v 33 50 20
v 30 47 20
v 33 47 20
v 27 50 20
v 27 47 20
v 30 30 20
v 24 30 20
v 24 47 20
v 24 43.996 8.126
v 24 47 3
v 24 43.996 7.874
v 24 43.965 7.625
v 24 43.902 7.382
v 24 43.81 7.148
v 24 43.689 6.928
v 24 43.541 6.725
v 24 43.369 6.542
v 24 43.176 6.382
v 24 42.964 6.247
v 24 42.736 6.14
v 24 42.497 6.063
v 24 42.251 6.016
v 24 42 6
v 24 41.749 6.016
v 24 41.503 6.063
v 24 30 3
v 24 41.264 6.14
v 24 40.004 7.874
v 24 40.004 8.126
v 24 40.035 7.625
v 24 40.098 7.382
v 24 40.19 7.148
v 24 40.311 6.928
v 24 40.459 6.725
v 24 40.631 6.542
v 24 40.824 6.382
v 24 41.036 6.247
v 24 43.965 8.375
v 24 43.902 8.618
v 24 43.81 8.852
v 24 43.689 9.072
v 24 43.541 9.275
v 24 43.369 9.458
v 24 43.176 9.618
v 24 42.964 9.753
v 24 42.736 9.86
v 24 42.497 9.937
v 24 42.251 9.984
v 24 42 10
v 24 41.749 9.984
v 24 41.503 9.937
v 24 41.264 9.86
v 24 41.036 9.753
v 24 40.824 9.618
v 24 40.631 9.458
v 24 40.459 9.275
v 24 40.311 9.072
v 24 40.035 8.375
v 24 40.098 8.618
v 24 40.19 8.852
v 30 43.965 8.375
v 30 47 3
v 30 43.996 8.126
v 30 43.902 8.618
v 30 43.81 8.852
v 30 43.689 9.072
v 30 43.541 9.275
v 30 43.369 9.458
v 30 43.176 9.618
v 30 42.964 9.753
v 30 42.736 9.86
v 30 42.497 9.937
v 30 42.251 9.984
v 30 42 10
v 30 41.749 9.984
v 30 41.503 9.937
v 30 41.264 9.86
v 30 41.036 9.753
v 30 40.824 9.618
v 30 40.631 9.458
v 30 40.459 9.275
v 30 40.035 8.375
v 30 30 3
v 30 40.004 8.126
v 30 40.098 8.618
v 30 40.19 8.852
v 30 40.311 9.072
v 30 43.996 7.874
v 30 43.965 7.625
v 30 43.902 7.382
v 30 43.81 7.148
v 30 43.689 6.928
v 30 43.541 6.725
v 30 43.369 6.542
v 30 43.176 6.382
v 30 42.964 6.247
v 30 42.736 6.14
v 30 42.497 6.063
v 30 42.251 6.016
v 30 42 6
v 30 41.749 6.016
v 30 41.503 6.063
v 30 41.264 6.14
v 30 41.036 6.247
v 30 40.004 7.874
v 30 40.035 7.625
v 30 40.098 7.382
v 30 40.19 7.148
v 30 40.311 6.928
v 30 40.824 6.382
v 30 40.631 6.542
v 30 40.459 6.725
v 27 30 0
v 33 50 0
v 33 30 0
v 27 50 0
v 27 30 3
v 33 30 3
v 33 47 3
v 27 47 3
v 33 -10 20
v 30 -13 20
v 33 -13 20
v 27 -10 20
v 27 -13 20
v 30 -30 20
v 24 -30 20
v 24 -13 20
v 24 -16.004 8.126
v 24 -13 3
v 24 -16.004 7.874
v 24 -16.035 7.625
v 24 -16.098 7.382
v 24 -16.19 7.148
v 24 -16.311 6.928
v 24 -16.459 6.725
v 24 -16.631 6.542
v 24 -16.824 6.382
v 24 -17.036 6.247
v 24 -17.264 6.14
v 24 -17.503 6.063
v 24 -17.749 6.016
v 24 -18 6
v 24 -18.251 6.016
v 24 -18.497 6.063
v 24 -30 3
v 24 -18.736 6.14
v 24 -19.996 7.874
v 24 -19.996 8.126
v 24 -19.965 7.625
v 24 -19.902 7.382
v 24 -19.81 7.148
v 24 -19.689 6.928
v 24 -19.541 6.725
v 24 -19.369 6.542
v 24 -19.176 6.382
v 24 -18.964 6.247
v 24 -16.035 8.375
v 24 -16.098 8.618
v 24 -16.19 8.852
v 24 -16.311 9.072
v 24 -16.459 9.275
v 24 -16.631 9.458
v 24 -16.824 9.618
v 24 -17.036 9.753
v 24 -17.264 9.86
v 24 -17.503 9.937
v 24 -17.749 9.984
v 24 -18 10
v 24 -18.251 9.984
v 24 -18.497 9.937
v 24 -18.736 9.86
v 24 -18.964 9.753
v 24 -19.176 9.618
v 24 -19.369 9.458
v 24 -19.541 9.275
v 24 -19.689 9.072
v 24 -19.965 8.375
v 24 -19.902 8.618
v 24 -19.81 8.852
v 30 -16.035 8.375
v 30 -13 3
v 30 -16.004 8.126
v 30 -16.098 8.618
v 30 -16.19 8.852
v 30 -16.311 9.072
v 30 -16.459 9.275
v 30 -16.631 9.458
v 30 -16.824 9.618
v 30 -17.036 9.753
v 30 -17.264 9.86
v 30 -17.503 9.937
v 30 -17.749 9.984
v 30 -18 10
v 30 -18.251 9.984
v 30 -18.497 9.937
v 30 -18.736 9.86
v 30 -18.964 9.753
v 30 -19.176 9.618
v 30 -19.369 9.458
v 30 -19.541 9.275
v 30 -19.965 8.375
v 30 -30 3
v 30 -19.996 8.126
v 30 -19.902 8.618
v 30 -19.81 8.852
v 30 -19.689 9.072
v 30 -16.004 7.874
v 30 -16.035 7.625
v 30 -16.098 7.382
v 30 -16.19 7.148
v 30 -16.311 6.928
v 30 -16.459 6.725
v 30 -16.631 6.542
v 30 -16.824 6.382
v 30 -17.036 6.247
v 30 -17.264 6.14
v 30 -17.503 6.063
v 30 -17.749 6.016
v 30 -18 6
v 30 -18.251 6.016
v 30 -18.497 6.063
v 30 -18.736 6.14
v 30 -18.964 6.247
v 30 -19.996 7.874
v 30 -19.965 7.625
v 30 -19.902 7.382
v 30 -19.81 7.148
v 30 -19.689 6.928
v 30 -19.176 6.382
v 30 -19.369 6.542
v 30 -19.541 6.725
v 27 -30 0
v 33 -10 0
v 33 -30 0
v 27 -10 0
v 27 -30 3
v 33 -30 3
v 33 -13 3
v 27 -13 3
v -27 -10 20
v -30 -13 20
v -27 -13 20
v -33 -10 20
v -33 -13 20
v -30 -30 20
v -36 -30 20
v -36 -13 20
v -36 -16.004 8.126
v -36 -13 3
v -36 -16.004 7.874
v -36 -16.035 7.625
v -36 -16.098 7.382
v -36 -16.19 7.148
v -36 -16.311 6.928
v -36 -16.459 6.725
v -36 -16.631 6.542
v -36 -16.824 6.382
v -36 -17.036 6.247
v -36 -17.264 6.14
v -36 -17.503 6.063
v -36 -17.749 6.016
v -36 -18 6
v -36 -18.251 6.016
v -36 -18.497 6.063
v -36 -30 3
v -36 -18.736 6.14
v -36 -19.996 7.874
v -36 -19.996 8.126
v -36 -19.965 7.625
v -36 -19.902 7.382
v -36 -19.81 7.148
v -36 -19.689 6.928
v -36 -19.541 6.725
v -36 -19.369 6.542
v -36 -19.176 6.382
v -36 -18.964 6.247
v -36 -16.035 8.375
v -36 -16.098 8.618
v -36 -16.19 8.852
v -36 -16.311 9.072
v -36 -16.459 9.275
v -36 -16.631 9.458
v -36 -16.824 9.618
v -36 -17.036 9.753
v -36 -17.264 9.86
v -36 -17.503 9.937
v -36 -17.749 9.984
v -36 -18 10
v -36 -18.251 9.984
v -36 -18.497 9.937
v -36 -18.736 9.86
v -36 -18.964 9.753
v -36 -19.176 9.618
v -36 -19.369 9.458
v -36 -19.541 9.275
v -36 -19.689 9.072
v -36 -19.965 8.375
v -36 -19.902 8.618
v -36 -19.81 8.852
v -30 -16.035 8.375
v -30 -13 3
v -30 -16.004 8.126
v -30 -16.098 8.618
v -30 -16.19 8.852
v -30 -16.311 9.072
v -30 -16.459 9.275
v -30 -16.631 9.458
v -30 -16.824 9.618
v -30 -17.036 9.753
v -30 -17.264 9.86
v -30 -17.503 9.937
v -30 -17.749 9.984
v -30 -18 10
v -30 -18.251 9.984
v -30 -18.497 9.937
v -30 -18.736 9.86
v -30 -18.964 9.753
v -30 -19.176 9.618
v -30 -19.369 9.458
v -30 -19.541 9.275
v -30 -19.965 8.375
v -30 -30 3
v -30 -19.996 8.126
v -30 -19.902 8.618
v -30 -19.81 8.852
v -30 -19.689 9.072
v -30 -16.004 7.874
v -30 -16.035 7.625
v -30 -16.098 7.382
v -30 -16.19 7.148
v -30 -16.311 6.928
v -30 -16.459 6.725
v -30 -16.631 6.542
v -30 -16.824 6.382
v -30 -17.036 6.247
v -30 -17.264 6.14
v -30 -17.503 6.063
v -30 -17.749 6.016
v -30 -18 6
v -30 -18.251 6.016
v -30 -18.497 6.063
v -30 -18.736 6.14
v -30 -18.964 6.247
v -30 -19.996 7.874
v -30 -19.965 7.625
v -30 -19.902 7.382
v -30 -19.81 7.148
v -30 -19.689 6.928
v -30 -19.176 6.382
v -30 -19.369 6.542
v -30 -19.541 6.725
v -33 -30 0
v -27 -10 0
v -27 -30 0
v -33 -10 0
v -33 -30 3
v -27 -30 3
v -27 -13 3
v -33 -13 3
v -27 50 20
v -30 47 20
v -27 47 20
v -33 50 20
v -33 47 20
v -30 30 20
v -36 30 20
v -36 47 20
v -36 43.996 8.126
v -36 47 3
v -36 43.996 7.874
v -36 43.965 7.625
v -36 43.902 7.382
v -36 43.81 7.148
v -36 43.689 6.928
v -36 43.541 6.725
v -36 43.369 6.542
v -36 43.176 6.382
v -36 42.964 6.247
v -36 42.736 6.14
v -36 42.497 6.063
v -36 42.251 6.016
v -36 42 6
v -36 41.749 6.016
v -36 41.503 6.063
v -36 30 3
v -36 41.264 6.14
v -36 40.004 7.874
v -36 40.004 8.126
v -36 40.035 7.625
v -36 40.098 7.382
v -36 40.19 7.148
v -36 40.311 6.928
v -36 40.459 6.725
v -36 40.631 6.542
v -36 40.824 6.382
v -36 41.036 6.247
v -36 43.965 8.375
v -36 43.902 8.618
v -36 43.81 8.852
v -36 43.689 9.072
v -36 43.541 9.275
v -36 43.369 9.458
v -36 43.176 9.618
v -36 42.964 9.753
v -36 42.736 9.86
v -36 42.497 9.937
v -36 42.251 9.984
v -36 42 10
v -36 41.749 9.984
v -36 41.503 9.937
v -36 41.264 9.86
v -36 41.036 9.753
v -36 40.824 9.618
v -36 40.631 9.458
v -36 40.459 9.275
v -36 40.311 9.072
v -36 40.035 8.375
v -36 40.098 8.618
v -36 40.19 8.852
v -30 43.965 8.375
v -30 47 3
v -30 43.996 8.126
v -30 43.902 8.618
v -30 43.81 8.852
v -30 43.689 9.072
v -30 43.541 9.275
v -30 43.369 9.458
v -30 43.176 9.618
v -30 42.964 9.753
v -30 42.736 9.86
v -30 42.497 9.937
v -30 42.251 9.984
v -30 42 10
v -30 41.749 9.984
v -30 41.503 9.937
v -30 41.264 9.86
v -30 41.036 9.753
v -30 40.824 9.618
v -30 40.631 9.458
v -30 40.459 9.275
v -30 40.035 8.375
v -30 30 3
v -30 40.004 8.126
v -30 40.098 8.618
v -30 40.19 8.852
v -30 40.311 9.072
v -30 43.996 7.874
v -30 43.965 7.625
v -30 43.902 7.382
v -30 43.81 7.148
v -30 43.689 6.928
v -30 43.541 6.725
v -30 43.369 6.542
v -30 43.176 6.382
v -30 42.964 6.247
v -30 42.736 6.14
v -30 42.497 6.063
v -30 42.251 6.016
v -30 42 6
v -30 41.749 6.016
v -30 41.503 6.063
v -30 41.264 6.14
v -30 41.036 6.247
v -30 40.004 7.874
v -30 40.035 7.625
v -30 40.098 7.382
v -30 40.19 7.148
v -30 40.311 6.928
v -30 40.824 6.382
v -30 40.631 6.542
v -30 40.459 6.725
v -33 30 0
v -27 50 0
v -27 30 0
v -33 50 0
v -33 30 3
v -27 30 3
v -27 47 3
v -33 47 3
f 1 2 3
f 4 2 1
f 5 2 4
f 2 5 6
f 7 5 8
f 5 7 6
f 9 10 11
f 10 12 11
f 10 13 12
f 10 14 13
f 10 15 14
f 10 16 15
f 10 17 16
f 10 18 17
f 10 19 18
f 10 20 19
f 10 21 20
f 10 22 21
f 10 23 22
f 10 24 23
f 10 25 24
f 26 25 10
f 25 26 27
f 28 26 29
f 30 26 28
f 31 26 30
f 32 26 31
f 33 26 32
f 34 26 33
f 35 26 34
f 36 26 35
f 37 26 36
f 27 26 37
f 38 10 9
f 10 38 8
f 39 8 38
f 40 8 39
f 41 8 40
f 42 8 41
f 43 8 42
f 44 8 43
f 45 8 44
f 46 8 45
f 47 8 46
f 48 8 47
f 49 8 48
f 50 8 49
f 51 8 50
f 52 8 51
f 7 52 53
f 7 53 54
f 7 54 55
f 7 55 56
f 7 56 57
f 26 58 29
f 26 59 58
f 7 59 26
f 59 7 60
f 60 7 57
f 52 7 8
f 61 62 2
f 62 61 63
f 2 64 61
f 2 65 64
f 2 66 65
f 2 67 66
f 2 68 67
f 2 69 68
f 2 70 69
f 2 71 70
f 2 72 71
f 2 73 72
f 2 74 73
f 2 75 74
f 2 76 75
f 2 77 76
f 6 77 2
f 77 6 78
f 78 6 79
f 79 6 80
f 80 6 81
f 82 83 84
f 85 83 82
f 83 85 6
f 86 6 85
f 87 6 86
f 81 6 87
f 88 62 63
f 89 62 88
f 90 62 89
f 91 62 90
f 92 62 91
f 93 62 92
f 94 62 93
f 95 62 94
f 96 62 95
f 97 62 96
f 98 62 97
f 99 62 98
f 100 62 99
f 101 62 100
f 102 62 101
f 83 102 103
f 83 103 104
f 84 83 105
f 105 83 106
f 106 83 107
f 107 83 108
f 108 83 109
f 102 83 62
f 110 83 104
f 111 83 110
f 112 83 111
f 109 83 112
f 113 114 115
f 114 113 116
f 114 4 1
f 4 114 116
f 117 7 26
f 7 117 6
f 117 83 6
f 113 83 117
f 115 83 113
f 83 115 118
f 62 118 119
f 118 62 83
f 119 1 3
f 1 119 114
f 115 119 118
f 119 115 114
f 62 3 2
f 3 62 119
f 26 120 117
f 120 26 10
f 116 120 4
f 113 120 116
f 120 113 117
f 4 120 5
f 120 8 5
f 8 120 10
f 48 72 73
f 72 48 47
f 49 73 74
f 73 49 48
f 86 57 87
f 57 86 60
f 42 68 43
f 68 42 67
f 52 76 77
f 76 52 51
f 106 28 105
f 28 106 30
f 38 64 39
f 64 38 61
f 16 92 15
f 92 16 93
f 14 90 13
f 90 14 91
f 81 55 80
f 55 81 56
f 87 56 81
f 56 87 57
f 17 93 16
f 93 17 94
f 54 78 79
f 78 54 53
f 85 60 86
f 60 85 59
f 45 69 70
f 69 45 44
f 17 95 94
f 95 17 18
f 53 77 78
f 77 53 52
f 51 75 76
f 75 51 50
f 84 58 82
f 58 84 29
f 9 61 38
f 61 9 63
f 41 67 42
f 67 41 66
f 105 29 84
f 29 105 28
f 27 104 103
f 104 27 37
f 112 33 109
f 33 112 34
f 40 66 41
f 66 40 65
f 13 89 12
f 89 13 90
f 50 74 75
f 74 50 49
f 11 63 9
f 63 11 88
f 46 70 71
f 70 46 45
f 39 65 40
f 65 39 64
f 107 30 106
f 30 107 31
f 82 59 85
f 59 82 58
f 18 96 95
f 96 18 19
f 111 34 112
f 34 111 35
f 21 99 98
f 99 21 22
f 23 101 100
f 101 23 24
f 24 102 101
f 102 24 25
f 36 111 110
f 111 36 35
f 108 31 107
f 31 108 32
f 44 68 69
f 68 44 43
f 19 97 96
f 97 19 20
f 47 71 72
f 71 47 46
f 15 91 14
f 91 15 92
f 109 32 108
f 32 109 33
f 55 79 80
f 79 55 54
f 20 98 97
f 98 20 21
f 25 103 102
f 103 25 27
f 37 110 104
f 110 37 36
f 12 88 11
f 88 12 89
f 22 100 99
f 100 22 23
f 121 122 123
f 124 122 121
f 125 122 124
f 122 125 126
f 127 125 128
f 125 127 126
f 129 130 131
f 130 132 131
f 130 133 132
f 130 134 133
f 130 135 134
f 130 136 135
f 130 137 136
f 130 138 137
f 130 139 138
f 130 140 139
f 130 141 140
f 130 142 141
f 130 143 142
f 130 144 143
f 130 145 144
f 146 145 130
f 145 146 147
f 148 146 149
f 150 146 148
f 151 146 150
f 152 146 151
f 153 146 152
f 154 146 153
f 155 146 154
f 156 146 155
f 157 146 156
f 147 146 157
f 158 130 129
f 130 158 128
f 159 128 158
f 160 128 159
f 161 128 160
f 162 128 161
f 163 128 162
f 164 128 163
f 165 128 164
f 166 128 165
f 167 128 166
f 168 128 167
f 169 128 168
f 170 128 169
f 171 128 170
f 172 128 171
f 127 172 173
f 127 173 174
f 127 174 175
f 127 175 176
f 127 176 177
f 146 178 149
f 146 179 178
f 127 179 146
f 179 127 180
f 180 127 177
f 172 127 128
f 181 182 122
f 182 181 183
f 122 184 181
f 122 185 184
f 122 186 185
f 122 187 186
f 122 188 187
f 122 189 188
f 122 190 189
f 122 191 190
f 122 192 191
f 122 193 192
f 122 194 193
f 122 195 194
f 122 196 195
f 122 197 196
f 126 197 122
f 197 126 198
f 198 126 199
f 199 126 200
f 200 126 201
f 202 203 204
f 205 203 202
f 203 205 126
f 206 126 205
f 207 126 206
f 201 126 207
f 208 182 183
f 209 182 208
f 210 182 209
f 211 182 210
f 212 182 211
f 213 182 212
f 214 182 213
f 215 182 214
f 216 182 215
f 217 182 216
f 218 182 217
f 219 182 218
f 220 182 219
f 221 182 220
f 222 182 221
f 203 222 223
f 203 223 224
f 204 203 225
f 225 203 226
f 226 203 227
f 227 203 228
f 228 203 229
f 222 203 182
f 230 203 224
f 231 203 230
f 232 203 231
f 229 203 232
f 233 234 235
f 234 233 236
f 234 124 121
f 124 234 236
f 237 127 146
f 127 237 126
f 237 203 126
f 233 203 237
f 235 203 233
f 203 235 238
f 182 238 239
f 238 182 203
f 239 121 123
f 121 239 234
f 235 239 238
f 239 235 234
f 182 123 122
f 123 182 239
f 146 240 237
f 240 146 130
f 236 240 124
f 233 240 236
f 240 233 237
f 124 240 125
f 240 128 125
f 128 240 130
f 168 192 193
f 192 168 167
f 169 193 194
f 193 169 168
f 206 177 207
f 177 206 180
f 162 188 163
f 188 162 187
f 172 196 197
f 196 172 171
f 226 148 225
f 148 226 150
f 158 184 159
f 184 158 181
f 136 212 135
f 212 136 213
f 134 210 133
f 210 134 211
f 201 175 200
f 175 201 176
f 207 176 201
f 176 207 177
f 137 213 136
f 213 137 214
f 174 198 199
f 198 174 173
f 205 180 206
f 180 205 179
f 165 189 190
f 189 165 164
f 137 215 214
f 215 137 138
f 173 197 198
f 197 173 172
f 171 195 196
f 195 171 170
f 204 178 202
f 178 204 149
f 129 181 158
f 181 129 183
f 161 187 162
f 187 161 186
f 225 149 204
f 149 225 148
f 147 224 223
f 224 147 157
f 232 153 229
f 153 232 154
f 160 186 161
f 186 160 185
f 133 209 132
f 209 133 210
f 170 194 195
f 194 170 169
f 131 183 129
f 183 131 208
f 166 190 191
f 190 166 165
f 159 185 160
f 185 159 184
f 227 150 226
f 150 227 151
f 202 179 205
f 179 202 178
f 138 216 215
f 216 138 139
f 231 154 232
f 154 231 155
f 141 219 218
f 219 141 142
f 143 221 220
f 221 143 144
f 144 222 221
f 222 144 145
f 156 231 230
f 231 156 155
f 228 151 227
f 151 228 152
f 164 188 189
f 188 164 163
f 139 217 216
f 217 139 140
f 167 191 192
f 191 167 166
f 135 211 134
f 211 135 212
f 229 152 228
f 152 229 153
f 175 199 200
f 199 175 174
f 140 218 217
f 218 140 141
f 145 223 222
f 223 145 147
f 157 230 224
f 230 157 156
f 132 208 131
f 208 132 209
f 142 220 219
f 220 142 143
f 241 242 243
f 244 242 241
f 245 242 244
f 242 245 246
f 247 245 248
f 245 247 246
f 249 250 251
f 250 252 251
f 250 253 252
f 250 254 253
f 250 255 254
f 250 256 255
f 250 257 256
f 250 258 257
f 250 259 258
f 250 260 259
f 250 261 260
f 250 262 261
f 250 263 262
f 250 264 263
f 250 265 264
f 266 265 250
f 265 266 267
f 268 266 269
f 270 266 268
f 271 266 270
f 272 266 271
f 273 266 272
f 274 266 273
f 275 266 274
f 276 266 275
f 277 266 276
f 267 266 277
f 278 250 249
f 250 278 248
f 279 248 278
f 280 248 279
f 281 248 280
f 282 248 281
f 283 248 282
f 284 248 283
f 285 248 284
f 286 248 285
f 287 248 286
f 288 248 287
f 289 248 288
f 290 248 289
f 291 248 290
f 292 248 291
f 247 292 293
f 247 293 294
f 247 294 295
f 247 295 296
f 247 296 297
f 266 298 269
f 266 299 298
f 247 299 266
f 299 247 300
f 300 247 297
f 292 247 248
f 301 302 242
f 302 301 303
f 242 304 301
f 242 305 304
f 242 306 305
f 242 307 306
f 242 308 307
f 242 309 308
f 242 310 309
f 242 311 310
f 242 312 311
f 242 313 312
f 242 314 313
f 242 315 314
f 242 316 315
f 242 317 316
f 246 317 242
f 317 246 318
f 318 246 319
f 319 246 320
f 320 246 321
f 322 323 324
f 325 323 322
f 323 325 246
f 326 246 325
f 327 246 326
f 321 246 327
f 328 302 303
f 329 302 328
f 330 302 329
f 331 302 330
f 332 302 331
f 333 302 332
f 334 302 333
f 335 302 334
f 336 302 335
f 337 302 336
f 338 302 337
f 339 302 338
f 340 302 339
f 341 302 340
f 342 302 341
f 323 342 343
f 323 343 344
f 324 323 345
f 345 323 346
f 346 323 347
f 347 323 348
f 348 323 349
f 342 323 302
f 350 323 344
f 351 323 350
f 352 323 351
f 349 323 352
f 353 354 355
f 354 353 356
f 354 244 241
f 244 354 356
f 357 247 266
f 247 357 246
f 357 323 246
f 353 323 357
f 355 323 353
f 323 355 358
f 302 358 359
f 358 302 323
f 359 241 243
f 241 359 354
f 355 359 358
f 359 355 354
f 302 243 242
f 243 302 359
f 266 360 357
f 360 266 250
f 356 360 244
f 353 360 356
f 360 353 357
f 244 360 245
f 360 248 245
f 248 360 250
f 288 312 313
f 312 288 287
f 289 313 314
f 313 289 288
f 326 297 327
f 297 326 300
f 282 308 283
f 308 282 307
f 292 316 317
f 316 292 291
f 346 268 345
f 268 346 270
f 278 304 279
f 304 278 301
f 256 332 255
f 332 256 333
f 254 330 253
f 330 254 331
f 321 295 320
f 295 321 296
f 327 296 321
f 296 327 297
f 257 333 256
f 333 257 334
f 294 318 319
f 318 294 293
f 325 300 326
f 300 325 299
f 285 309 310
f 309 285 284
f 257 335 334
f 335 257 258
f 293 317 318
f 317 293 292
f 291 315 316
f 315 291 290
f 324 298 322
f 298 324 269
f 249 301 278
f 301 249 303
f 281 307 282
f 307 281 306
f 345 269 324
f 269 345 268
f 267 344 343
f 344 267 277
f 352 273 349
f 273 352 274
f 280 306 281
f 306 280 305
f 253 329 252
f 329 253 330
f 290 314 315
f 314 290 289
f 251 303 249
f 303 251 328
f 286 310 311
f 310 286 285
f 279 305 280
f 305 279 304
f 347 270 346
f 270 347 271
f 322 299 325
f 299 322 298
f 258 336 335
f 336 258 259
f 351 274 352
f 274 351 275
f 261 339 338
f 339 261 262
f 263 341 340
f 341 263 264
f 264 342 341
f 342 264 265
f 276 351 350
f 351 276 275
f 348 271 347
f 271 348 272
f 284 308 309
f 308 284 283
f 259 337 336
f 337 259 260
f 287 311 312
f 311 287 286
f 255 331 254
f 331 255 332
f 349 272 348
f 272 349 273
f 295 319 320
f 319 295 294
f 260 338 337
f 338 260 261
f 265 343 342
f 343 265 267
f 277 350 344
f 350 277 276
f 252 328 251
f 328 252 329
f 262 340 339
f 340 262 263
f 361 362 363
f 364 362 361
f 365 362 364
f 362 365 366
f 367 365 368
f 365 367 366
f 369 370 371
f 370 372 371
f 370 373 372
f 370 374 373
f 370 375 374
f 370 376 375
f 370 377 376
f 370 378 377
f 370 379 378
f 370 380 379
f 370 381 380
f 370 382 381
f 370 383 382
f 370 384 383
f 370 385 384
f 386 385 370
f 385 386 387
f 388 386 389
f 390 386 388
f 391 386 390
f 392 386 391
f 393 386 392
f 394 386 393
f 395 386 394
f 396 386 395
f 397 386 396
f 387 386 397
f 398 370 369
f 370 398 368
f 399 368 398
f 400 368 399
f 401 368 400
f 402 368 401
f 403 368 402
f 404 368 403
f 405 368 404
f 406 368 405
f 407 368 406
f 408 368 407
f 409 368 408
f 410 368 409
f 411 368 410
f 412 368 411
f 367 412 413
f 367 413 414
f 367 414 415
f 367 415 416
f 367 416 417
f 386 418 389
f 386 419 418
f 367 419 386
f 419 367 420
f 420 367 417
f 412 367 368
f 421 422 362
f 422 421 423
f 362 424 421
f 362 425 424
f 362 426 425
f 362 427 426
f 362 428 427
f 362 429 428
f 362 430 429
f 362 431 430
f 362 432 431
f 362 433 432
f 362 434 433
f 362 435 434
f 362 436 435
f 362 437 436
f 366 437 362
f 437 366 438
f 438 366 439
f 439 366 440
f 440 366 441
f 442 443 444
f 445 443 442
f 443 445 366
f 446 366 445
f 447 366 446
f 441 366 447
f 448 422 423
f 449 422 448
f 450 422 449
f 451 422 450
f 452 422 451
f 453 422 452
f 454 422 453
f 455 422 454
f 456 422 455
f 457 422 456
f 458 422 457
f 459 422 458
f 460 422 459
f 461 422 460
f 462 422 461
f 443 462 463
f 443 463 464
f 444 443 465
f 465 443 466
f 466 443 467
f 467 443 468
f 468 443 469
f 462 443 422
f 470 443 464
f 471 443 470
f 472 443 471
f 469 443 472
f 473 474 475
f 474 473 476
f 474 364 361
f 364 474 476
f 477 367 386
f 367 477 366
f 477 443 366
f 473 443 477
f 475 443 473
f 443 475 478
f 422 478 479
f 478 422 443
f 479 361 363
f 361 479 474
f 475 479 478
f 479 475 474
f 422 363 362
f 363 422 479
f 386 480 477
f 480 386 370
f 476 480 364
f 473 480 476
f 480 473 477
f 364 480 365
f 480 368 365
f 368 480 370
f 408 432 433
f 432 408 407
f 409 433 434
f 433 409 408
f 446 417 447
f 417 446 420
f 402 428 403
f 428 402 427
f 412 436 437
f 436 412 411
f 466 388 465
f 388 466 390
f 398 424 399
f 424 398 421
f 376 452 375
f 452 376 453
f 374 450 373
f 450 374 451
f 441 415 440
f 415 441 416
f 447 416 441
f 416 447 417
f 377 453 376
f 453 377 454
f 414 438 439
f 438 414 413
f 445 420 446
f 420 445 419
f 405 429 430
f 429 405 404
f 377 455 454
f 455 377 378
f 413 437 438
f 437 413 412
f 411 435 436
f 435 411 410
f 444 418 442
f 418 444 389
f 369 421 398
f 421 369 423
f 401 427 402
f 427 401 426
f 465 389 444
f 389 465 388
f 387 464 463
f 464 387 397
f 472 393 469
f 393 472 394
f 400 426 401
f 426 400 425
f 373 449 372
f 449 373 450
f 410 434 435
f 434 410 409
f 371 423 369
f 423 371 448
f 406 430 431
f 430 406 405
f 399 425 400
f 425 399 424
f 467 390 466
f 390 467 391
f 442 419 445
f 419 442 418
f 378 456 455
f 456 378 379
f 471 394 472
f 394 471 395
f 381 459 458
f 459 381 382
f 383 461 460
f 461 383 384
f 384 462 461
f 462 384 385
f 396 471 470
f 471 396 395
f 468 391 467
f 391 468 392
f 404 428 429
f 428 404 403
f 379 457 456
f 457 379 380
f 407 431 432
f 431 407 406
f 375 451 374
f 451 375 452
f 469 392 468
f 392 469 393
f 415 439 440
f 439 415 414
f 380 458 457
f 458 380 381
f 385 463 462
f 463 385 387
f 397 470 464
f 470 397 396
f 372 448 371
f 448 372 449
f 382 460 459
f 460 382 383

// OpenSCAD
$fn=50;
Hoehe=6;
Laenge=20;
Breite=20;
Rand=3;
LochD=4;
LochPos=5;

module DoIt()
{
    difference()
    {
        union()
        {
            cube([Laenge,Breite,Hoehe],false);
            translate([0,0,-Rand]) cube([Rand,Breite,Rand],false);
            translate([0,Breite-Rand,-Rand]) cube([Laenge,Rand,Rand],false);
        }
        union()
        {
            translate([0,0,Hoehe-Rand]) cube([Rand,Breite,Rand],false);
            translate([0,Breite-Rand,Hoehe-Rand]) cube([Laenge,Rand,Rand],false);
            translate([Rand+LochPos,Breite-Rand-LochPos,Hoehe/2]) cylinder(h=Hoehe*2,d=LochD,center=true);
        }
    }
}

translate([30,30,0]) rotate([0,-90,0]) DoIt();
translate([30,-30,0]) rotate([0,-90,0]) DoIt();
translate([-30,-30,0]) rotate([0,-90,0]) DoIt();
translate([-30,30,0]) rotate([0,-90,0]) DoIt();
